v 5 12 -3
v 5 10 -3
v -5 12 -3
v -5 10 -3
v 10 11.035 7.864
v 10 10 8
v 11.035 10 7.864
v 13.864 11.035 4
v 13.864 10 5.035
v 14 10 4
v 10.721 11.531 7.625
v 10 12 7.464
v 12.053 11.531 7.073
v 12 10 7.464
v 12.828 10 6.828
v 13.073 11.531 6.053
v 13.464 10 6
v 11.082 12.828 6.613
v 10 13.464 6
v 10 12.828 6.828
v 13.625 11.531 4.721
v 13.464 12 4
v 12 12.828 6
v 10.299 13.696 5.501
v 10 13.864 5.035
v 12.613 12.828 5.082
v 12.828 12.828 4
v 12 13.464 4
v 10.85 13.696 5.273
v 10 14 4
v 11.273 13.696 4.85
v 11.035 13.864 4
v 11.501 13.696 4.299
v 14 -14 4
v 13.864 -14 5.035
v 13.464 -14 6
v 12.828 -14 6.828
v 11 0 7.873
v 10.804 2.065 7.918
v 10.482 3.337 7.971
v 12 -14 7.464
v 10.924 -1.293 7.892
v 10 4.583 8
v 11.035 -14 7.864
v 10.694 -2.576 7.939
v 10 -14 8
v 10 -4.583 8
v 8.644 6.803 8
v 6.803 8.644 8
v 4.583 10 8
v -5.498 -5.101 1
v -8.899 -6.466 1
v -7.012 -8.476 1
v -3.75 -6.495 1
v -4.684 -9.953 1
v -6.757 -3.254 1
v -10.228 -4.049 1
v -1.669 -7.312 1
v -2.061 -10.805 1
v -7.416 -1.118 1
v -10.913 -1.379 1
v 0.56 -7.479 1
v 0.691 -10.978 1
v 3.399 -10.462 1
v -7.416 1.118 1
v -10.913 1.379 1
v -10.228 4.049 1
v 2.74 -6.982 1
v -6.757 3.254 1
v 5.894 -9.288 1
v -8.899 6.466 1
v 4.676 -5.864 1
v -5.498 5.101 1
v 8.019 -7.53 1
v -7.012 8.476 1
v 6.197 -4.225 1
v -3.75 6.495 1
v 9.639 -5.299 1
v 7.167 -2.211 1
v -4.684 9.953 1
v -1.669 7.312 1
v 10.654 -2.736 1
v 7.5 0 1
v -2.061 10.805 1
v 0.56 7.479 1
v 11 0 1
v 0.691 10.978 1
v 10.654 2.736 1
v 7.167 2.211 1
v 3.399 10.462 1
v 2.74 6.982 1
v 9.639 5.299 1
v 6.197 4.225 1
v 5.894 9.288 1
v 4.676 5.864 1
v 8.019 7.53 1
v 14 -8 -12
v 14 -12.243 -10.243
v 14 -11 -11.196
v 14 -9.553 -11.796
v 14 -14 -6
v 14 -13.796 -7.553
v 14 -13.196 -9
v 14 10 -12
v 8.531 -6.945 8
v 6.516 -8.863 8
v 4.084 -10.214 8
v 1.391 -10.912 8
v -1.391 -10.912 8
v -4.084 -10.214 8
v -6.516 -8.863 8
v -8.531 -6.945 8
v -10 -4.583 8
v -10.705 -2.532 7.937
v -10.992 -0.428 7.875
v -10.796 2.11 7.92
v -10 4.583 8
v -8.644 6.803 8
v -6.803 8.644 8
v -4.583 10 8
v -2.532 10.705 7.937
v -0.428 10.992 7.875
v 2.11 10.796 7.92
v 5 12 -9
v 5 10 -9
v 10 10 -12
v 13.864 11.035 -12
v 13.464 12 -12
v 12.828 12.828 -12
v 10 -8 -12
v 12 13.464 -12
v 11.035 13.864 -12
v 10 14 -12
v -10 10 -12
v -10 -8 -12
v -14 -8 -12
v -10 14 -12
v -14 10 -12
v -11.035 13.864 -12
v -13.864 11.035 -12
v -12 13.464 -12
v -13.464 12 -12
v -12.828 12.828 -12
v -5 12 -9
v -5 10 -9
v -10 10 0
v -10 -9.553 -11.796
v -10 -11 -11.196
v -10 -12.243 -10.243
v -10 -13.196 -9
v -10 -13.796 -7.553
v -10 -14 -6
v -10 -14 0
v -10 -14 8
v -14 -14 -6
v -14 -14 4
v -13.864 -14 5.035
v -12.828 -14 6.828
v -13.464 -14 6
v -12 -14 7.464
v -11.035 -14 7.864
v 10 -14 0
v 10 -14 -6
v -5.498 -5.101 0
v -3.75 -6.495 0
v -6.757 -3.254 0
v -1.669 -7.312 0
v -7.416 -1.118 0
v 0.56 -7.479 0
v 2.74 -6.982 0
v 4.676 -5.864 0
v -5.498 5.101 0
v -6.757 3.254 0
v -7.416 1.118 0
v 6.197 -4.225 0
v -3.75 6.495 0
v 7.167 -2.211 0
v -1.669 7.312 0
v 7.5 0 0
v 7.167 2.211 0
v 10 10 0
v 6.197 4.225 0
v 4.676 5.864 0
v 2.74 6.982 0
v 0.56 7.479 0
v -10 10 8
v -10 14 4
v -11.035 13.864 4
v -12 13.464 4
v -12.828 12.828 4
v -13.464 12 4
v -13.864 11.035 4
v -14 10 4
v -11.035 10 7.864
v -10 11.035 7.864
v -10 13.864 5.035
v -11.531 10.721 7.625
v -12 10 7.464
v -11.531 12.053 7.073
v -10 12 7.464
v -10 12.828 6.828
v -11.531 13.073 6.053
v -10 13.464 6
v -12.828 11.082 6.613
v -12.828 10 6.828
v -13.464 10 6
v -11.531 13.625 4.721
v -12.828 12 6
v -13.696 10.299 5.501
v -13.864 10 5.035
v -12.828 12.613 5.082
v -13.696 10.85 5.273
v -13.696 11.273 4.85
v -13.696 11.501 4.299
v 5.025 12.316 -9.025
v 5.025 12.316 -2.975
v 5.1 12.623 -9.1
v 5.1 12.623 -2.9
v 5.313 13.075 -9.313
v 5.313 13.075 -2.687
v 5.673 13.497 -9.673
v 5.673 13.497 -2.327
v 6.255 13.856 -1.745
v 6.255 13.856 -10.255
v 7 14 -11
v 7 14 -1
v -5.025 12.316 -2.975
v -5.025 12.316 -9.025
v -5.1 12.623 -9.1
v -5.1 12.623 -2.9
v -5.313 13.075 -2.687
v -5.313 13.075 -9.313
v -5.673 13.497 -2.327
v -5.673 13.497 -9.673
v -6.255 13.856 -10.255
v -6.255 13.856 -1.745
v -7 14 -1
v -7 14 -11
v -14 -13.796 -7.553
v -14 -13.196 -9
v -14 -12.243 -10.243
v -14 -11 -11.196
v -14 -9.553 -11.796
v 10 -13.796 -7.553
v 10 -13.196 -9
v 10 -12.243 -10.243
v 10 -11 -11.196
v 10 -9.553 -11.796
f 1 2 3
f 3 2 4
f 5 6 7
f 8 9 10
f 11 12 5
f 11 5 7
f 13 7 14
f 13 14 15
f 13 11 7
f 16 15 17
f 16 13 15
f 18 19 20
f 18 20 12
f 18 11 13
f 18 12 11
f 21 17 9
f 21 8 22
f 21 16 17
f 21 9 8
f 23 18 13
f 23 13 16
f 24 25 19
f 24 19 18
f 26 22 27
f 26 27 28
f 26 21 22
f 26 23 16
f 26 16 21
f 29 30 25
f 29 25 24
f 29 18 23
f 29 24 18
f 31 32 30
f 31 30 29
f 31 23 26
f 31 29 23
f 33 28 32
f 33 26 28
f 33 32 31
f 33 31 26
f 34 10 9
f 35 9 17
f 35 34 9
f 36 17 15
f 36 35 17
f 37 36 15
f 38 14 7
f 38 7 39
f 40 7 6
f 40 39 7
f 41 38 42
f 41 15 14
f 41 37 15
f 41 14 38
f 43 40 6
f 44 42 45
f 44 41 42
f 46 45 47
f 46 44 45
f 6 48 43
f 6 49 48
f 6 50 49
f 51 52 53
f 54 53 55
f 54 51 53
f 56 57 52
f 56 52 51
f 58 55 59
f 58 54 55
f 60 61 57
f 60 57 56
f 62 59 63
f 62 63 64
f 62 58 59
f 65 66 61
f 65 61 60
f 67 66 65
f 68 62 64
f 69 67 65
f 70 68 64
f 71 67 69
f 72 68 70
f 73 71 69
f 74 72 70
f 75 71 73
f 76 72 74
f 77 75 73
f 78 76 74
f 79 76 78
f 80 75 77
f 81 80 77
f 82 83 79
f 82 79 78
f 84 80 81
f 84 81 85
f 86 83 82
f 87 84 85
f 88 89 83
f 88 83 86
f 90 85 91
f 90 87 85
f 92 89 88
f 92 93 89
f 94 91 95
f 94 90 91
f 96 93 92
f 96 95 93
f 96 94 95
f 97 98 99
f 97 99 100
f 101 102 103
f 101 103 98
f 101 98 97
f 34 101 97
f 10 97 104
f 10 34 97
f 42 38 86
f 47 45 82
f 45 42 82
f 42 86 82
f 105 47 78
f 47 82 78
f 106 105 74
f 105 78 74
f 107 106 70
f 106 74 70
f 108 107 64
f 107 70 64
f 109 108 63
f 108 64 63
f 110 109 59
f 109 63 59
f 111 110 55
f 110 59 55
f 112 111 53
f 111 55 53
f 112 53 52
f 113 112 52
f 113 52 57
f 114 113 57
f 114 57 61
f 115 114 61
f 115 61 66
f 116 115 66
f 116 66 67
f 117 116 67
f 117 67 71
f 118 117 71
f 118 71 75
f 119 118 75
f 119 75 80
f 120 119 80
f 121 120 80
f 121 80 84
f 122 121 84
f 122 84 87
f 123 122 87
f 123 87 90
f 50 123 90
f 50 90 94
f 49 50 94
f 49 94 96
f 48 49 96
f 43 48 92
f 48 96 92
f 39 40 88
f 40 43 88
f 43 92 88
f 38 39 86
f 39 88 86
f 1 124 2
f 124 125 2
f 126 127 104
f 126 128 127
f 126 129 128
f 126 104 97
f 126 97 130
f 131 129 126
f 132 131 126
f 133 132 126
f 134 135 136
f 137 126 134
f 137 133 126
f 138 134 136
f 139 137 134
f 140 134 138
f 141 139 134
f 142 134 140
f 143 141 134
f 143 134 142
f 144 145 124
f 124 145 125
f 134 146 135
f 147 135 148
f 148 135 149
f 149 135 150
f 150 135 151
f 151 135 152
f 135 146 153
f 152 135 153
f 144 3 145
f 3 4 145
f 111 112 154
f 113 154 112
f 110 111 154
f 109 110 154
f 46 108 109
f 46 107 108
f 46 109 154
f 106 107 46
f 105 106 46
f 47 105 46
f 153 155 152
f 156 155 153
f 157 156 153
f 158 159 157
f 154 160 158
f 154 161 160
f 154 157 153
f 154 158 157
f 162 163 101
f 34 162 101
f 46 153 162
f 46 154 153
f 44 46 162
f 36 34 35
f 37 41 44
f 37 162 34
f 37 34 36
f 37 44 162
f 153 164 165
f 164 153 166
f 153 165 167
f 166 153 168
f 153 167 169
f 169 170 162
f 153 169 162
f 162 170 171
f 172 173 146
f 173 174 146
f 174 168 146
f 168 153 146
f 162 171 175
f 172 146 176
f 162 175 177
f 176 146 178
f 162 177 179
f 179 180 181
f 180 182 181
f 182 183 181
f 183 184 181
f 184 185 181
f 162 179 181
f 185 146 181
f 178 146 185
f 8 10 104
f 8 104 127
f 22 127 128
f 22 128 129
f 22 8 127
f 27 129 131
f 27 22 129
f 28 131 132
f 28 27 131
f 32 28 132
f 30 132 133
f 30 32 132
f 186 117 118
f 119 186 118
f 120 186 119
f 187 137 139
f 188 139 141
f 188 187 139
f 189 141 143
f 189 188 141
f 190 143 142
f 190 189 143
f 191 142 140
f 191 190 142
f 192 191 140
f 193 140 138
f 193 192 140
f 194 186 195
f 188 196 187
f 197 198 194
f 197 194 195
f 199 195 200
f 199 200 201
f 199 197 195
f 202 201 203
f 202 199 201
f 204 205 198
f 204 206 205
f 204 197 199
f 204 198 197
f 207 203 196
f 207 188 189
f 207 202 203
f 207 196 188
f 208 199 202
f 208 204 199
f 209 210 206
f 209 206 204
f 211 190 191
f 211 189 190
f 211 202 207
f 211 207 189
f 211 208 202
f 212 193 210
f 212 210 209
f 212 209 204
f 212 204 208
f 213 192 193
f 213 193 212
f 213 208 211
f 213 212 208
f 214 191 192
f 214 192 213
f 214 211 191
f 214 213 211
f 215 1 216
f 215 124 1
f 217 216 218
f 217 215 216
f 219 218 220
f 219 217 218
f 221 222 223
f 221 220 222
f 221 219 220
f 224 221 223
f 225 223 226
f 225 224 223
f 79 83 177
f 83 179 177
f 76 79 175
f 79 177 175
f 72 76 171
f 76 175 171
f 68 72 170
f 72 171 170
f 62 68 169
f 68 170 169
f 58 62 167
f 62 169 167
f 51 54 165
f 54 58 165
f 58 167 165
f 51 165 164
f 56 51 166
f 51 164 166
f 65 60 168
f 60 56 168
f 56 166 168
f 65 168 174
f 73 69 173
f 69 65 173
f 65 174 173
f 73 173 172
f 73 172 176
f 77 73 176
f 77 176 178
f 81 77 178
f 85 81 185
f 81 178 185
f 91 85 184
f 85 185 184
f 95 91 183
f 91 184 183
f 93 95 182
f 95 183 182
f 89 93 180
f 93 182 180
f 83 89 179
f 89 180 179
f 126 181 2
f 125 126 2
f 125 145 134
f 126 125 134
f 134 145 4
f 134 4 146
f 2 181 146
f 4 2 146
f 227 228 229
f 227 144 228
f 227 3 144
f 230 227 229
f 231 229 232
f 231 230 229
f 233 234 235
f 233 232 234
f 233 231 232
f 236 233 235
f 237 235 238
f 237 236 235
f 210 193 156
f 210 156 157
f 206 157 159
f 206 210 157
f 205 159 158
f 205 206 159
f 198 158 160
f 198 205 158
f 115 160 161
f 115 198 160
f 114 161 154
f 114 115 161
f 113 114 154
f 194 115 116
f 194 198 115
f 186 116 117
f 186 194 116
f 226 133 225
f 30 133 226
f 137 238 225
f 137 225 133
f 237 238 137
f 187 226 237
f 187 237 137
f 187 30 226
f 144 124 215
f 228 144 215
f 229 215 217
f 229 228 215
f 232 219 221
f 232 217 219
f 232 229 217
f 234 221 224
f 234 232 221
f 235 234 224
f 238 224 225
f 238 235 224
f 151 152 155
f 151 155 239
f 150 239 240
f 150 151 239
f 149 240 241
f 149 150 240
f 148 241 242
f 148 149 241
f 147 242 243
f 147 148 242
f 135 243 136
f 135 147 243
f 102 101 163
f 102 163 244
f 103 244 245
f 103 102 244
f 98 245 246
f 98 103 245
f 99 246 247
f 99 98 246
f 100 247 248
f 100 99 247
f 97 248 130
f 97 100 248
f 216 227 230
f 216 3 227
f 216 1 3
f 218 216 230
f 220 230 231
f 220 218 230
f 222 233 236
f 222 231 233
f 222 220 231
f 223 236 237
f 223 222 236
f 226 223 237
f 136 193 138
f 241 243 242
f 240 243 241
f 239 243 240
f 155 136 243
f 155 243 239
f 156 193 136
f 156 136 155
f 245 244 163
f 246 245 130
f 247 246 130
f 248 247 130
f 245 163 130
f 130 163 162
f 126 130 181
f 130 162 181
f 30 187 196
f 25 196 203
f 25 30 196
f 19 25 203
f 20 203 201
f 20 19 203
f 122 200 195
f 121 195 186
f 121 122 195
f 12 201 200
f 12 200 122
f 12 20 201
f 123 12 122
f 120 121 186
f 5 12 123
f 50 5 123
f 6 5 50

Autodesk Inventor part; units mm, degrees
ref_plane "YZ Plane" through (0, 0, 0) normal (1, 0, 0) x (0, 1, 0)
ref_plane "XZ Plane" through (0, 0, 0) normal (0, 1, 0) x (-1, 0, 0)
ref_plane "XY Plane" through (0, 0, 0) normal (0, 0, 1) x (1, 0, 0)
sketch "Sketch1" plane through (0, 0, 0) normal (0, 0, 1) x (1, 0, 0)
  circle A0 centre (0, 0) radius 7.5
  line L0 (-10, 10) -> (10, 10)
  line L1 (10, 10) -> (10, -10)
  line L2 (10, -10) -> (-10, -10)
  line L3 (-10, -10) -> (-10, 10)
  line L4 (-10, -10) -> (-14, -10)
  line L5 (-14, -10) -> (-14, 10)
  line L6 (-14, 10) -> (-10, 10)
  line L7 (-10, 10) -> (-10, -10)
  line L8 (10, -10) -> (14, -10)
  line L9 (14, -10) -> (14, 10)
  line L10 (14, 10) -> (10, 10)
  line L11 (10, 10) -> (10, -10)
  line L12 (14, 10) -> (-14, 10)
  line L13 (-14, 10) -> (-14, 14)
  line L14 (-14, 14) -> (14, 14)
  line L15 (14, 14) -> (14, 10)
  line L16 (14, -10) -> (-14, -10)
  line L17 (-14, -10) -> (-14, -14)
  line L18 (-14, -14) -> (14, -14)
  line L19 (14, -14) -> (14, -10)
  dimension "d0" = 15
  dimension "d1" = 20
  dimension "d2" = 20
  dimension "d3" = 4
  dimension "d4" = 4
  dimension "d5" = 4
  dimension "d9" = 4
extrude "Extrusion1" add sketch "Sketch1" along normal blind 1
sketch "Sketch2" plane through (0, 0, 1) normal (0, 0, 1) x (1, 0, 0)
  circle A0 centre (0, 0) radius 7.5 projected
  circle A1 centre (0, 0) radius 11
  line L0 (14, 14) -> (-14, 14) projected
  circle A2 centre (0, 0) radius 7.5 projected
  line L1 (-14, 14) -> (-14, -14) projected
  line L2 (-14, -14) -> (14, -14) projected
  line L3 (14, -14) -> (14, 14) projected
  dimension "d8" = 22
extrude "Extrusion2" add sketch "Sketch2" along normal blind 7 contours L3 L2 L1 L0
sketch "Sketch3" plane through (0, 0, 0) normal (0, 0, -1) x (-1, 0, 0)
  line L0 (14, 14) -> (14, -14) projected
  line L1 (-14, 14) -> (14, 14) projected
  line L2 (-14, -14) -> (-14, 14) projected
  line L3 (14, -14) -> (-14, -14) projected
  circle A0 centre (0, 0) radius 7.5 projected
  line L4 (10, 10) -> (10, -10)
  line L5 (10, -10) -> (-10, -10)
  line L6 (-10, -10) -> (-10, 10)
  line L7 (-10, 10) -> (10, 10)
  line L8 (-10, -10) -> (-10, -14)
  line L9 (10, -10) -> (10, -14)
  line L10 (14, -14) -> (-14, -14) projected
  dimension "d12" = 4
extrude "Extrusion3" add sketch "Sketch3" along normal blind 12 contours L0 L3 L9 L4 L7 L6 L8 L2 L1
fillet "Fillet1" radius 6 2 edges at (-12, -14, -12) (12, -14, -12)
fillet "Fillet2" radius 4 5 edges at (-14, 14, -2) (0, 14, 8) (14, 14, -2) (-14, 0, 8) (14, 0, 8)
sketch "Sketch4" plane through (-10, 10, 0) normal (0, -1, 0) x (1, 0, 0)
  line L0 (15, -3) -> (5, -3)
  line L1 (5, -3) -> (5, -9)
  line L2 (5, -9) -> (15, -9)
  line L3 (15, -9) -> (15, -3)
  line L4 (0, 0) -> (20, 0) projected
  line L5 (20, -12) -> (20, -6) projected
  point P0 (10, 0)
  dimension "d17" = 10
  dimension "d18" = 6
  dimension "d19" = 3
  dimension "d20" = 5
extrude "Extrusion4" cut sketch "Sketch4" against normal blind 10
fillet "Fillet3" radius 2 4 edges at (0, 14, -9) (-5, 14, -6) (5, 14, -6) (0, 14, -3)
properties part number "mocowanie lozyska 10-2"
